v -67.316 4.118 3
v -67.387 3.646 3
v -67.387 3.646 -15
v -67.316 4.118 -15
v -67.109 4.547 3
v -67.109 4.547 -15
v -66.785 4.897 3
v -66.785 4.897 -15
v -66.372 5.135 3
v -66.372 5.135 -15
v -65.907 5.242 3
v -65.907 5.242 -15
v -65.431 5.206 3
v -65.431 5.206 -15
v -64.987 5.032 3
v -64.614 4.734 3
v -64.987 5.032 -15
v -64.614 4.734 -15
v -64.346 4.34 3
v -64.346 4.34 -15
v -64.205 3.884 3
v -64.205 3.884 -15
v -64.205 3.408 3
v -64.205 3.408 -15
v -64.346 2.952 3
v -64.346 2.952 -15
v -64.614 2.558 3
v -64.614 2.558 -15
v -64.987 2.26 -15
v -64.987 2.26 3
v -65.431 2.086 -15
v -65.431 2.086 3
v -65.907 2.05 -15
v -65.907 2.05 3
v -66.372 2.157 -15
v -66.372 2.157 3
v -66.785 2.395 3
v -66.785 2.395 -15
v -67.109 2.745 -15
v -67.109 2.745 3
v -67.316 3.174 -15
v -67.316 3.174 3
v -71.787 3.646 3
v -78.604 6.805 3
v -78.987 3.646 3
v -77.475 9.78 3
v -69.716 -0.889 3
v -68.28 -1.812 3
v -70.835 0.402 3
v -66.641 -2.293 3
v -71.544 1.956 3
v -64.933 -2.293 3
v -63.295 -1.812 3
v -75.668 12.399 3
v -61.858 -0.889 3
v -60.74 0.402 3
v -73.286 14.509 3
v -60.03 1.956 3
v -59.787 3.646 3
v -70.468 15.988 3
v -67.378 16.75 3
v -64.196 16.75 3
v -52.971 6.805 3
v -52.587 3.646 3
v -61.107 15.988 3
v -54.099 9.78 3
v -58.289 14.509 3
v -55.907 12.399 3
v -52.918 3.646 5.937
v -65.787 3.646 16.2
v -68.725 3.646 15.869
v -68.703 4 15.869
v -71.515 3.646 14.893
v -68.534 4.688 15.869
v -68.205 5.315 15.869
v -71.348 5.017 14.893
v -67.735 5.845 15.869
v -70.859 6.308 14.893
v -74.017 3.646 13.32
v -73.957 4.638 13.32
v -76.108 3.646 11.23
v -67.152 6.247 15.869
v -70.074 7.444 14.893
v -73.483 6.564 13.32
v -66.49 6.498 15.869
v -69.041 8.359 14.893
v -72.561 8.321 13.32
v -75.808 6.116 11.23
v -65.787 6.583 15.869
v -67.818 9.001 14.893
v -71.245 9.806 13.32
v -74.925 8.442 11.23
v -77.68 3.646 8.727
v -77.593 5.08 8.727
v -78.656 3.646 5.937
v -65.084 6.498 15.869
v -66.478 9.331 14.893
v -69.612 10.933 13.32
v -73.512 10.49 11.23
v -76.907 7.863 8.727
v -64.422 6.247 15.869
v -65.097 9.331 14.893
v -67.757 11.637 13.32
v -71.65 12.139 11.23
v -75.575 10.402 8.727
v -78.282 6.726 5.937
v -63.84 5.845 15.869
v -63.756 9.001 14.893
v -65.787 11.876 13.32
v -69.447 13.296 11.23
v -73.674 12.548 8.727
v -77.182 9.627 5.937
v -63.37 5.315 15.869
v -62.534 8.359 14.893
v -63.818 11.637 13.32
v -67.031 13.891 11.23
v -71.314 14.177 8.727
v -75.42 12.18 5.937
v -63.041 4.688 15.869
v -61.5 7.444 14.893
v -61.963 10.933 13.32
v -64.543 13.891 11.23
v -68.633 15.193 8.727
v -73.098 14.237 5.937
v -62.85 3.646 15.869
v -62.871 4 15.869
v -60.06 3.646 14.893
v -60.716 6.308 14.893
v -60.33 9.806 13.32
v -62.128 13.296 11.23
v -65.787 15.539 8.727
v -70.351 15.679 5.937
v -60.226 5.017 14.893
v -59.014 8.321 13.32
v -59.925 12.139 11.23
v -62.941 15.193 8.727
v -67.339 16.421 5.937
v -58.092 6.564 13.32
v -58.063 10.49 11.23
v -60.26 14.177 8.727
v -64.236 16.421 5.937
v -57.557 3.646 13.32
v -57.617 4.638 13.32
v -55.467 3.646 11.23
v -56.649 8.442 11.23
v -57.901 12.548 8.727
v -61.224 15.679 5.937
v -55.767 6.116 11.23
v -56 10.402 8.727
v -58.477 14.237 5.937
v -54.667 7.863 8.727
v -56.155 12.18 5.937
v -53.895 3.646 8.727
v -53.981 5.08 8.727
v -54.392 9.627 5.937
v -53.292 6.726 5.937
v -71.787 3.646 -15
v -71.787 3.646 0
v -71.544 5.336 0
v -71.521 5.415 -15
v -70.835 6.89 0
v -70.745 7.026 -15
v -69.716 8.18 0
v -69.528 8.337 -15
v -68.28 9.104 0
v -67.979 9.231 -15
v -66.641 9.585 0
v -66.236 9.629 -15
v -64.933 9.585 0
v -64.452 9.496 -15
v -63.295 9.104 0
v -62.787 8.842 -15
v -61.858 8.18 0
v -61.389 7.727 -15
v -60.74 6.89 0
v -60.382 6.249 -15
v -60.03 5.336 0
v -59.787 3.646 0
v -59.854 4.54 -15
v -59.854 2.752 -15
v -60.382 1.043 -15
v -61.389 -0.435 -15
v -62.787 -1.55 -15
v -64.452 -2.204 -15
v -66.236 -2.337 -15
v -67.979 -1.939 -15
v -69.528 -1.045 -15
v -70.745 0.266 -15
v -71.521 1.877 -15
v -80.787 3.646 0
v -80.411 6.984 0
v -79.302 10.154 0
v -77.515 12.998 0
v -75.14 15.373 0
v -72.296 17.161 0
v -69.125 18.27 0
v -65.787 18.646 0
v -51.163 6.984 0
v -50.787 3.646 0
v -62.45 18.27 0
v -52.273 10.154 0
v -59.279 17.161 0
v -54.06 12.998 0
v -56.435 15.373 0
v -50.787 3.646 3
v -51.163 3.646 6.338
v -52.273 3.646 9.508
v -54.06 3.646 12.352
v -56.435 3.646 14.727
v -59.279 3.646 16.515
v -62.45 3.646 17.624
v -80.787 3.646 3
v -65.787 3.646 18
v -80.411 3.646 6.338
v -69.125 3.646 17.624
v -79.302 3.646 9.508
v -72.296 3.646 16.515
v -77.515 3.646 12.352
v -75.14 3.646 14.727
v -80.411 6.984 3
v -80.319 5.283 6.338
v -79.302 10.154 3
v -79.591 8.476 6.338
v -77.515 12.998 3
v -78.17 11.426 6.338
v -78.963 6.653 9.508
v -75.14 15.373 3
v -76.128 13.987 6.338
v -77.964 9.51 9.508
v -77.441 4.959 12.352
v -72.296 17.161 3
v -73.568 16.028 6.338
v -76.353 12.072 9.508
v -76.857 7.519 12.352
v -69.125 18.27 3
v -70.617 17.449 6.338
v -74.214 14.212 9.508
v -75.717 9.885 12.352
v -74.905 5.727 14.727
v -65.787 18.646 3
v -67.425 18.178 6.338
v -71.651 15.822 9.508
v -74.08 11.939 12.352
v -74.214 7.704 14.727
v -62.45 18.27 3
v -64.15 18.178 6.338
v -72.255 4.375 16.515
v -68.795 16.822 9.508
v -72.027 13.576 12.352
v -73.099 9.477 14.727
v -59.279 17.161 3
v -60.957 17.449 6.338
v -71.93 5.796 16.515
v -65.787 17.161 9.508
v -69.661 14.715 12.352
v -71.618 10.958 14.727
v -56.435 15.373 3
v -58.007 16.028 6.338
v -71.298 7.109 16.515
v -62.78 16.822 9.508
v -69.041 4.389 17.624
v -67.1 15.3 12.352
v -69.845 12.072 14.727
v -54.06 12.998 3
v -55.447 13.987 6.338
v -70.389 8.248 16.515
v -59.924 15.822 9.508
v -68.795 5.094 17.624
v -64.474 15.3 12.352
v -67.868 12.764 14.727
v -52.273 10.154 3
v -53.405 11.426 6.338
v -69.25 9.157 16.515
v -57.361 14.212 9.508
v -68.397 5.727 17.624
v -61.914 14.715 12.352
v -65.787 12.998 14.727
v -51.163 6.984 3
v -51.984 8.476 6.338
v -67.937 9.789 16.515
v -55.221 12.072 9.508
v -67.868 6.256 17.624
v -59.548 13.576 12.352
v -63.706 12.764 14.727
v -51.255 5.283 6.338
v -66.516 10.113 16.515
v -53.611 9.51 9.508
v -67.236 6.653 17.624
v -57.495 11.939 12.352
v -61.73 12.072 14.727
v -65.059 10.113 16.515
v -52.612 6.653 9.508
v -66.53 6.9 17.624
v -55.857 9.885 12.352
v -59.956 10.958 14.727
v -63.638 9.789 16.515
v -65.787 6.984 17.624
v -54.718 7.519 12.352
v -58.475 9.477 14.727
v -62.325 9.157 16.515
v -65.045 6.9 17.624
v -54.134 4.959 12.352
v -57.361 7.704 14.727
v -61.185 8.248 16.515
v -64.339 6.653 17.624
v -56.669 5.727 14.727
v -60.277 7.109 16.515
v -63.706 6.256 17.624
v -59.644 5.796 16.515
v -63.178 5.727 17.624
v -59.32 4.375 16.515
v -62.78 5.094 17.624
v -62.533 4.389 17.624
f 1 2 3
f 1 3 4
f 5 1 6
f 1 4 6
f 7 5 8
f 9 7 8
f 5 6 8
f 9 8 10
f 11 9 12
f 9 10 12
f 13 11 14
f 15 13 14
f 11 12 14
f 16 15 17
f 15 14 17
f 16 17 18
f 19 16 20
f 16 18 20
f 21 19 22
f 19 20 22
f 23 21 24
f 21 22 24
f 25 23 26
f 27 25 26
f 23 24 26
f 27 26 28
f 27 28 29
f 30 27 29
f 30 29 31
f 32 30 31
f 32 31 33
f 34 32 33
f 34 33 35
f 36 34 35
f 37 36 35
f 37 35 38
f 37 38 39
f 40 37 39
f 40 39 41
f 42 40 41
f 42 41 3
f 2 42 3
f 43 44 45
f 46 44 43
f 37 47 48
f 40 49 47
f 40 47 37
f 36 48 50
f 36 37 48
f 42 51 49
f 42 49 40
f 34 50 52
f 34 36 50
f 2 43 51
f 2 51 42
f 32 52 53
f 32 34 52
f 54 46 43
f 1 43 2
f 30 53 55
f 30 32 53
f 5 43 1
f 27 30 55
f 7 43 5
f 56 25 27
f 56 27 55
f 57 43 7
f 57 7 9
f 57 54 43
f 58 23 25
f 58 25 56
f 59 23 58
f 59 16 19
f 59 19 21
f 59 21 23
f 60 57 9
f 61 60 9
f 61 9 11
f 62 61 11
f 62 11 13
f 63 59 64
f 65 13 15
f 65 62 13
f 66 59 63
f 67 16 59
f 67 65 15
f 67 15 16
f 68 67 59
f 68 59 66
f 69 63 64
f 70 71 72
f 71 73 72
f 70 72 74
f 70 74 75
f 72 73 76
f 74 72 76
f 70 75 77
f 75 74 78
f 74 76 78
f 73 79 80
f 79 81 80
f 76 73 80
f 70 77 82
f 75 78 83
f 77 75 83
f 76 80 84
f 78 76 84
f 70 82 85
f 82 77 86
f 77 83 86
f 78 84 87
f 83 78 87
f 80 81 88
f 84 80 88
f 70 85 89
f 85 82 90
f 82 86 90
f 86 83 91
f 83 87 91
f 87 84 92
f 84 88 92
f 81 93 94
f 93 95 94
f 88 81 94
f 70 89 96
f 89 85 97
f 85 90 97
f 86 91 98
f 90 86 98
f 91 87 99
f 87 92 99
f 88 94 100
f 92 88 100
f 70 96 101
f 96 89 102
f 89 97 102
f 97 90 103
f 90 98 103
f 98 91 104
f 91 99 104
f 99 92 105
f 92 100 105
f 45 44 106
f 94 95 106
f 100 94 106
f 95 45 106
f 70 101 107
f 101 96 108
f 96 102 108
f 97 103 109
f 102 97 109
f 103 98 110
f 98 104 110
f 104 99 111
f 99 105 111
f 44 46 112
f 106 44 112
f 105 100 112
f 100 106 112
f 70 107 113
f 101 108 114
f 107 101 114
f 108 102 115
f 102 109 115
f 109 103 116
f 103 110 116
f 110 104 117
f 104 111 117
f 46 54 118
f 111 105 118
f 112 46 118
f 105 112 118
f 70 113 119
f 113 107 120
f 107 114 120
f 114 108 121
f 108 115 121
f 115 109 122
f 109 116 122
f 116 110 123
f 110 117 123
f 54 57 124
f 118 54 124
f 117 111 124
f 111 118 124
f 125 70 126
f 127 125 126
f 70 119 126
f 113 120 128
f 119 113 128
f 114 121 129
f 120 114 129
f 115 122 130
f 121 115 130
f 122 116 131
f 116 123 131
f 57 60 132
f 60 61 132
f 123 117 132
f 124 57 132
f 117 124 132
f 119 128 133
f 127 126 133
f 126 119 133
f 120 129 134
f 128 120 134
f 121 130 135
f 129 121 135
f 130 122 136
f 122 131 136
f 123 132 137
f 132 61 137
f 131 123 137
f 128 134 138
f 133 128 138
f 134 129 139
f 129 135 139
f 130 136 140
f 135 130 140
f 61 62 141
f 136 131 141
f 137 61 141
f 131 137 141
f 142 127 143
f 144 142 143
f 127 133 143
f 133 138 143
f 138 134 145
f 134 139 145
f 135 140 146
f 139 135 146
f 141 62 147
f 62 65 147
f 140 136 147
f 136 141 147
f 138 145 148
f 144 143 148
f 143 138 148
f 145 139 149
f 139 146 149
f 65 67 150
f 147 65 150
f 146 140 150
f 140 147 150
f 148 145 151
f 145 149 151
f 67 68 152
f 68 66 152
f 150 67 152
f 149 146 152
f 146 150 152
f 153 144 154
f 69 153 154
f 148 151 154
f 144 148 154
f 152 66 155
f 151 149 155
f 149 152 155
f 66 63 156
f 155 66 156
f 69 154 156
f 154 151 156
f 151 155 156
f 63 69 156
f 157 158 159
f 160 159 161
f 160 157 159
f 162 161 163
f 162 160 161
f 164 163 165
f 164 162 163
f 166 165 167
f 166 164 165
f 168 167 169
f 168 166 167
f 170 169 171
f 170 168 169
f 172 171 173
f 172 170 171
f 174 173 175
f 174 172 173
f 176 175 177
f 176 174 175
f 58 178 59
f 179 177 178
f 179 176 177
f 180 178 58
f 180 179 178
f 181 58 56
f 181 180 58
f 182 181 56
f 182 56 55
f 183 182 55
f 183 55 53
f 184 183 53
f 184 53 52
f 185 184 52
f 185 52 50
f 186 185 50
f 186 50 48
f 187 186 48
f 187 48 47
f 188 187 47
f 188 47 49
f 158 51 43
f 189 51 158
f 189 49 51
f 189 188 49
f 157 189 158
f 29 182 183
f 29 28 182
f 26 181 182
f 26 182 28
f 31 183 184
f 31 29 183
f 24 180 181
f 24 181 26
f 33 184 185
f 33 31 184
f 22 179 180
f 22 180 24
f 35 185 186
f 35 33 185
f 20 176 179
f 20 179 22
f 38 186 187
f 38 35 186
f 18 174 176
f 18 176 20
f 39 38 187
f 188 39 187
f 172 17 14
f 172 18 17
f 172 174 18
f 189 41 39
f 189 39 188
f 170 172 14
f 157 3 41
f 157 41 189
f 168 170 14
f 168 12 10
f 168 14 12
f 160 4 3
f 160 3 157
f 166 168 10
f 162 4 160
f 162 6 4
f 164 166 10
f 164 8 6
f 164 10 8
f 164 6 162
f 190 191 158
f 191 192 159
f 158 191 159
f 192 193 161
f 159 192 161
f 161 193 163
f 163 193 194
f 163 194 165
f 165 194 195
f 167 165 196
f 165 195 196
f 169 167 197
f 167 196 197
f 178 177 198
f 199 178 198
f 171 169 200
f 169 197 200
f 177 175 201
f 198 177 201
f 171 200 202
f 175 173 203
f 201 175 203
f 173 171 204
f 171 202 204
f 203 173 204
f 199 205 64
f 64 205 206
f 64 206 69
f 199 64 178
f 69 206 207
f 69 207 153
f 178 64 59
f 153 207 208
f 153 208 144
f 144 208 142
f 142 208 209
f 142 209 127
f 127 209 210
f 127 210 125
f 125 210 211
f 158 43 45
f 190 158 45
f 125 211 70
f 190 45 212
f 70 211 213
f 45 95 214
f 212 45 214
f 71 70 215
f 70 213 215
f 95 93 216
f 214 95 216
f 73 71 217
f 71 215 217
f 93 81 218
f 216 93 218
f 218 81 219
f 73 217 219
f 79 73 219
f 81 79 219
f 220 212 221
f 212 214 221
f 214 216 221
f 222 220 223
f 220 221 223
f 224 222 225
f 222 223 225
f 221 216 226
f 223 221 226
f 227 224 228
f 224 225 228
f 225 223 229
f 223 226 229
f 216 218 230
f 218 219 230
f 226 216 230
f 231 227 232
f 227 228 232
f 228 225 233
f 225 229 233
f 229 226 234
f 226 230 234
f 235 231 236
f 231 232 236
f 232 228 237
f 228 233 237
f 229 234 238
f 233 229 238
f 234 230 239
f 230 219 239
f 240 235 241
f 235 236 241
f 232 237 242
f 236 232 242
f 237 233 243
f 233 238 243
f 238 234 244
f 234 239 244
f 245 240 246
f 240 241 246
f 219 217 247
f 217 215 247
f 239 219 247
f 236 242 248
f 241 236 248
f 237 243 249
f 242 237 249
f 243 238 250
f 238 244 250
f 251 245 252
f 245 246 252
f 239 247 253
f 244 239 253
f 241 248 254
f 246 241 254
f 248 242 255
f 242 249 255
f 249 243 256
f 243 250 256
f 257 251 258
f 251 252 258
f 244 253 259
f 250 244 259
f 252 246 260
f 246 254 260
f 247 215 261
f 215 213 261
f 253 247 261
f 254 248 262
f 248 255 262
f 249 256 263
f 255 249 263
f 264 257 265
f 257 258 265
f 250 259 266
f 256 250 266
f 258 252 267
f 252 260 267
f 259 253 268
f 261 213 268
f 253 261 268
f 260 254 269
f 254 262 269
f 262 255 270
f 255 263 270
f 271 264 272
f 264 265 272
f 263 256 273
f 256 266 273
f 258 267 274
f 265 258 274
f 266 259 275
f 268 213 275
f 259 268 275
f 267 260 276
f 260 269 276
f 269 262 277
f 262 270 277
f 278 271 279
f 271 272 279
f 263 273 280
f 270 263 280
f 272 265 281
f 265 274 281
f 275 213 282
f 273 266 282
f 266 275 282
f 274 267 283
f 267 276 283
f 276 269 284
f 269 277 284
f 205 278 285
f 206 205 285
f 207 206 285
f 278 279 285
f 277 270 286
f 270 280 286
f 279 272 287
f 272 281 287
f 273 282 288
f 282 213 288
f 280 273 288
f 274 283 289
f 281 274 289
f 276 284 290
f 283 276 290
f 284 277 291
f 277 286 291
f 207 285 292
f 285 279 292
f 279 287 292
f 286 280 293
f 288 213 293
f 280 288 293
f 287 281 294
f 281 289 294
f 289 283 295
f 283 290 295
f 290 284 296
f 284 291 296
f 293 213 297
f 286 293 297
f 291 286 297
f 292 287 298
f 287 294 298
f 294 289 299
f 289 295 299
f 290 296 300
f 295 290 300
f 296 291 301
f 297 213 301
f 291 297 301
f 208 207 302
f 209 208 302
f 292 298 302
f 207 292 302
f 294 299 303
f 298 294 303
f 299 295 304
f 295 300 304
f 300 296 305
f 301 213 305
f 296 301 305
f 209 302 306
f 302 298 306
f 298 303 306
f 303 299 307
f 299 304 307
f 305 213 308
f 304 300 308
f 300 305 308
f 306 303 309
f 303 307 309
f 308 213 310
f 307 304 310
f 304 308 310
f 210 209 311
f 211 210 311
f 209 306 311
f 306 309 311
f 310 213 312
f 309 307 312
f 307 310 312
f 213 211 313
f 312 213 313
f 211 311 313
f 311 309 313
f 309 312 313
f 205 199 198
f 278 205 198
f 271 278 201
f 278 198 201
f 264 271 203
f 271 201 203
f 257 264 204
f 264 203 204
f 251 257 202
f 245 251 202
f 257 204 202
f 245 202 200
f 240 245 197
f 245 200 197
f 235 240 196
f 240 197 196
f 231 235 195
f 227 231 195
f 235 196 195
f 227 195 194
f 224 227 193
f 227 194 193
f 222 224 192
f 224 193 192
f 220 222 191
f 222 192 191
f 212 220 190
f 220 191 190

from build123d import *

# Parameters (mm, degrees)
SALIENTE_EXTRUIR1_DEPTH = 3
REVOLUCI_N1_ANGLE       = 180
SALIENTE_EXTRUIR2_DEPTH = 3
CROQUIS4_R              = 1.6
CORTAR_EXTRUIR1_DEPTH   = 3
SALIENTE_EXTRUIR3_START = 15
CROQUIS5_R              = 6
CROQUIS5_R_2            = 1.6
SALIENTE_EXTRUIR3_DEPTH = 15


with BuildPart() as part:
    # Croquis1 → Saliente-Extruir1 (new body)
    with BuildSketch(Plane.XY):
        with BuildLine():
            Line((-80.787332882, 3.645984144), (-50.787332882, 3.645984144))
            ThreePointArc((-50.787332882, 3.645984144), (-65.787332882, 18.645984144), (-80.787332882, 3.645984144))
        make_face()
    extrude(amount=SALIENTE_EXTRUIR1_DEPTH)

    # Croquis2 → Revolución1 (revolve)
    with BuildSketch(Plane.XZ.offset(-3.645984144)):
        with BuildLine():
            Line((-65.787332882, 18), (-65.787332882, 16.2))
            ThreePointArc((-65.787332882, 16.2), (-75.121142393, 12.333809512), (-78.987332882, 3))
            Line((-78.987332882, 3), (-80.787332882, 3))
            ThreePointArc((-80.787332882, 3), (-76.393934599, 13.606601718), (-65.787332882, 18))
        make_face()
    revolve(axis=Axis((-65.787332882, 3.645984144, 3), (0, 0, -1)), revolution_arc=REVOLUCI_N1_ANGLE)

    # Croquis3 → Saliente-Extruir2 (add)
    with BuildSketch(Plane(origin=(0, 0, 0), x_dir=(-1, 0, 0), z_dir=(0, 0, -1))):
        with BuildLine():
            Line((65.787332882, 3.645984144), (71.787332882, 3.645984144))
            ThreePointArc((71.787332882, 3.645984144), (65.787332882, -2.354015856), (59.787332882, 3.645984144))
            Line((59.787332882, 3.645984144), (65.787332882, 3.645984144))
        make_face()
    extrude(amount=-SALIENTE_EXTRUIR2_DEPTH)

    # Croquis4 → Cortar-Extruir1 (cut)
    with BuildSketch(Plane(origin=(0, 0, 0), x_dir=(-1, 0, 0), z_dir=(0, 0, -1))):
        with Locations((65.787332882, 3.645984144)):
            Circle(CROQUIS4_R)
    extrude(amount=-CORTAR_EXTRUIR1_DEPTH, mode=Mode.SUBTRACT)

    # Croquis5 → Saliente-Extruir3 (add)
    with BuildSketch(Plane(origin=(0, 0, 0), x_dir=(-1, 0, 0), z_dir=(0, 0, -1)).offset(SALIENTE_EXTRUIR3_START)):
        with Locations((65.787332882, 3.645984144)):
            Circle(CROQUIS5_R)
        with Locations((65.787332882, 3.645984144)):
            Circle(CROQUIS5_R_2, mode=Mode.SUBTRACT)
    extrude(amount=-SALIENTE_EXTRUIR3_DEPTH)


solid = part.part
